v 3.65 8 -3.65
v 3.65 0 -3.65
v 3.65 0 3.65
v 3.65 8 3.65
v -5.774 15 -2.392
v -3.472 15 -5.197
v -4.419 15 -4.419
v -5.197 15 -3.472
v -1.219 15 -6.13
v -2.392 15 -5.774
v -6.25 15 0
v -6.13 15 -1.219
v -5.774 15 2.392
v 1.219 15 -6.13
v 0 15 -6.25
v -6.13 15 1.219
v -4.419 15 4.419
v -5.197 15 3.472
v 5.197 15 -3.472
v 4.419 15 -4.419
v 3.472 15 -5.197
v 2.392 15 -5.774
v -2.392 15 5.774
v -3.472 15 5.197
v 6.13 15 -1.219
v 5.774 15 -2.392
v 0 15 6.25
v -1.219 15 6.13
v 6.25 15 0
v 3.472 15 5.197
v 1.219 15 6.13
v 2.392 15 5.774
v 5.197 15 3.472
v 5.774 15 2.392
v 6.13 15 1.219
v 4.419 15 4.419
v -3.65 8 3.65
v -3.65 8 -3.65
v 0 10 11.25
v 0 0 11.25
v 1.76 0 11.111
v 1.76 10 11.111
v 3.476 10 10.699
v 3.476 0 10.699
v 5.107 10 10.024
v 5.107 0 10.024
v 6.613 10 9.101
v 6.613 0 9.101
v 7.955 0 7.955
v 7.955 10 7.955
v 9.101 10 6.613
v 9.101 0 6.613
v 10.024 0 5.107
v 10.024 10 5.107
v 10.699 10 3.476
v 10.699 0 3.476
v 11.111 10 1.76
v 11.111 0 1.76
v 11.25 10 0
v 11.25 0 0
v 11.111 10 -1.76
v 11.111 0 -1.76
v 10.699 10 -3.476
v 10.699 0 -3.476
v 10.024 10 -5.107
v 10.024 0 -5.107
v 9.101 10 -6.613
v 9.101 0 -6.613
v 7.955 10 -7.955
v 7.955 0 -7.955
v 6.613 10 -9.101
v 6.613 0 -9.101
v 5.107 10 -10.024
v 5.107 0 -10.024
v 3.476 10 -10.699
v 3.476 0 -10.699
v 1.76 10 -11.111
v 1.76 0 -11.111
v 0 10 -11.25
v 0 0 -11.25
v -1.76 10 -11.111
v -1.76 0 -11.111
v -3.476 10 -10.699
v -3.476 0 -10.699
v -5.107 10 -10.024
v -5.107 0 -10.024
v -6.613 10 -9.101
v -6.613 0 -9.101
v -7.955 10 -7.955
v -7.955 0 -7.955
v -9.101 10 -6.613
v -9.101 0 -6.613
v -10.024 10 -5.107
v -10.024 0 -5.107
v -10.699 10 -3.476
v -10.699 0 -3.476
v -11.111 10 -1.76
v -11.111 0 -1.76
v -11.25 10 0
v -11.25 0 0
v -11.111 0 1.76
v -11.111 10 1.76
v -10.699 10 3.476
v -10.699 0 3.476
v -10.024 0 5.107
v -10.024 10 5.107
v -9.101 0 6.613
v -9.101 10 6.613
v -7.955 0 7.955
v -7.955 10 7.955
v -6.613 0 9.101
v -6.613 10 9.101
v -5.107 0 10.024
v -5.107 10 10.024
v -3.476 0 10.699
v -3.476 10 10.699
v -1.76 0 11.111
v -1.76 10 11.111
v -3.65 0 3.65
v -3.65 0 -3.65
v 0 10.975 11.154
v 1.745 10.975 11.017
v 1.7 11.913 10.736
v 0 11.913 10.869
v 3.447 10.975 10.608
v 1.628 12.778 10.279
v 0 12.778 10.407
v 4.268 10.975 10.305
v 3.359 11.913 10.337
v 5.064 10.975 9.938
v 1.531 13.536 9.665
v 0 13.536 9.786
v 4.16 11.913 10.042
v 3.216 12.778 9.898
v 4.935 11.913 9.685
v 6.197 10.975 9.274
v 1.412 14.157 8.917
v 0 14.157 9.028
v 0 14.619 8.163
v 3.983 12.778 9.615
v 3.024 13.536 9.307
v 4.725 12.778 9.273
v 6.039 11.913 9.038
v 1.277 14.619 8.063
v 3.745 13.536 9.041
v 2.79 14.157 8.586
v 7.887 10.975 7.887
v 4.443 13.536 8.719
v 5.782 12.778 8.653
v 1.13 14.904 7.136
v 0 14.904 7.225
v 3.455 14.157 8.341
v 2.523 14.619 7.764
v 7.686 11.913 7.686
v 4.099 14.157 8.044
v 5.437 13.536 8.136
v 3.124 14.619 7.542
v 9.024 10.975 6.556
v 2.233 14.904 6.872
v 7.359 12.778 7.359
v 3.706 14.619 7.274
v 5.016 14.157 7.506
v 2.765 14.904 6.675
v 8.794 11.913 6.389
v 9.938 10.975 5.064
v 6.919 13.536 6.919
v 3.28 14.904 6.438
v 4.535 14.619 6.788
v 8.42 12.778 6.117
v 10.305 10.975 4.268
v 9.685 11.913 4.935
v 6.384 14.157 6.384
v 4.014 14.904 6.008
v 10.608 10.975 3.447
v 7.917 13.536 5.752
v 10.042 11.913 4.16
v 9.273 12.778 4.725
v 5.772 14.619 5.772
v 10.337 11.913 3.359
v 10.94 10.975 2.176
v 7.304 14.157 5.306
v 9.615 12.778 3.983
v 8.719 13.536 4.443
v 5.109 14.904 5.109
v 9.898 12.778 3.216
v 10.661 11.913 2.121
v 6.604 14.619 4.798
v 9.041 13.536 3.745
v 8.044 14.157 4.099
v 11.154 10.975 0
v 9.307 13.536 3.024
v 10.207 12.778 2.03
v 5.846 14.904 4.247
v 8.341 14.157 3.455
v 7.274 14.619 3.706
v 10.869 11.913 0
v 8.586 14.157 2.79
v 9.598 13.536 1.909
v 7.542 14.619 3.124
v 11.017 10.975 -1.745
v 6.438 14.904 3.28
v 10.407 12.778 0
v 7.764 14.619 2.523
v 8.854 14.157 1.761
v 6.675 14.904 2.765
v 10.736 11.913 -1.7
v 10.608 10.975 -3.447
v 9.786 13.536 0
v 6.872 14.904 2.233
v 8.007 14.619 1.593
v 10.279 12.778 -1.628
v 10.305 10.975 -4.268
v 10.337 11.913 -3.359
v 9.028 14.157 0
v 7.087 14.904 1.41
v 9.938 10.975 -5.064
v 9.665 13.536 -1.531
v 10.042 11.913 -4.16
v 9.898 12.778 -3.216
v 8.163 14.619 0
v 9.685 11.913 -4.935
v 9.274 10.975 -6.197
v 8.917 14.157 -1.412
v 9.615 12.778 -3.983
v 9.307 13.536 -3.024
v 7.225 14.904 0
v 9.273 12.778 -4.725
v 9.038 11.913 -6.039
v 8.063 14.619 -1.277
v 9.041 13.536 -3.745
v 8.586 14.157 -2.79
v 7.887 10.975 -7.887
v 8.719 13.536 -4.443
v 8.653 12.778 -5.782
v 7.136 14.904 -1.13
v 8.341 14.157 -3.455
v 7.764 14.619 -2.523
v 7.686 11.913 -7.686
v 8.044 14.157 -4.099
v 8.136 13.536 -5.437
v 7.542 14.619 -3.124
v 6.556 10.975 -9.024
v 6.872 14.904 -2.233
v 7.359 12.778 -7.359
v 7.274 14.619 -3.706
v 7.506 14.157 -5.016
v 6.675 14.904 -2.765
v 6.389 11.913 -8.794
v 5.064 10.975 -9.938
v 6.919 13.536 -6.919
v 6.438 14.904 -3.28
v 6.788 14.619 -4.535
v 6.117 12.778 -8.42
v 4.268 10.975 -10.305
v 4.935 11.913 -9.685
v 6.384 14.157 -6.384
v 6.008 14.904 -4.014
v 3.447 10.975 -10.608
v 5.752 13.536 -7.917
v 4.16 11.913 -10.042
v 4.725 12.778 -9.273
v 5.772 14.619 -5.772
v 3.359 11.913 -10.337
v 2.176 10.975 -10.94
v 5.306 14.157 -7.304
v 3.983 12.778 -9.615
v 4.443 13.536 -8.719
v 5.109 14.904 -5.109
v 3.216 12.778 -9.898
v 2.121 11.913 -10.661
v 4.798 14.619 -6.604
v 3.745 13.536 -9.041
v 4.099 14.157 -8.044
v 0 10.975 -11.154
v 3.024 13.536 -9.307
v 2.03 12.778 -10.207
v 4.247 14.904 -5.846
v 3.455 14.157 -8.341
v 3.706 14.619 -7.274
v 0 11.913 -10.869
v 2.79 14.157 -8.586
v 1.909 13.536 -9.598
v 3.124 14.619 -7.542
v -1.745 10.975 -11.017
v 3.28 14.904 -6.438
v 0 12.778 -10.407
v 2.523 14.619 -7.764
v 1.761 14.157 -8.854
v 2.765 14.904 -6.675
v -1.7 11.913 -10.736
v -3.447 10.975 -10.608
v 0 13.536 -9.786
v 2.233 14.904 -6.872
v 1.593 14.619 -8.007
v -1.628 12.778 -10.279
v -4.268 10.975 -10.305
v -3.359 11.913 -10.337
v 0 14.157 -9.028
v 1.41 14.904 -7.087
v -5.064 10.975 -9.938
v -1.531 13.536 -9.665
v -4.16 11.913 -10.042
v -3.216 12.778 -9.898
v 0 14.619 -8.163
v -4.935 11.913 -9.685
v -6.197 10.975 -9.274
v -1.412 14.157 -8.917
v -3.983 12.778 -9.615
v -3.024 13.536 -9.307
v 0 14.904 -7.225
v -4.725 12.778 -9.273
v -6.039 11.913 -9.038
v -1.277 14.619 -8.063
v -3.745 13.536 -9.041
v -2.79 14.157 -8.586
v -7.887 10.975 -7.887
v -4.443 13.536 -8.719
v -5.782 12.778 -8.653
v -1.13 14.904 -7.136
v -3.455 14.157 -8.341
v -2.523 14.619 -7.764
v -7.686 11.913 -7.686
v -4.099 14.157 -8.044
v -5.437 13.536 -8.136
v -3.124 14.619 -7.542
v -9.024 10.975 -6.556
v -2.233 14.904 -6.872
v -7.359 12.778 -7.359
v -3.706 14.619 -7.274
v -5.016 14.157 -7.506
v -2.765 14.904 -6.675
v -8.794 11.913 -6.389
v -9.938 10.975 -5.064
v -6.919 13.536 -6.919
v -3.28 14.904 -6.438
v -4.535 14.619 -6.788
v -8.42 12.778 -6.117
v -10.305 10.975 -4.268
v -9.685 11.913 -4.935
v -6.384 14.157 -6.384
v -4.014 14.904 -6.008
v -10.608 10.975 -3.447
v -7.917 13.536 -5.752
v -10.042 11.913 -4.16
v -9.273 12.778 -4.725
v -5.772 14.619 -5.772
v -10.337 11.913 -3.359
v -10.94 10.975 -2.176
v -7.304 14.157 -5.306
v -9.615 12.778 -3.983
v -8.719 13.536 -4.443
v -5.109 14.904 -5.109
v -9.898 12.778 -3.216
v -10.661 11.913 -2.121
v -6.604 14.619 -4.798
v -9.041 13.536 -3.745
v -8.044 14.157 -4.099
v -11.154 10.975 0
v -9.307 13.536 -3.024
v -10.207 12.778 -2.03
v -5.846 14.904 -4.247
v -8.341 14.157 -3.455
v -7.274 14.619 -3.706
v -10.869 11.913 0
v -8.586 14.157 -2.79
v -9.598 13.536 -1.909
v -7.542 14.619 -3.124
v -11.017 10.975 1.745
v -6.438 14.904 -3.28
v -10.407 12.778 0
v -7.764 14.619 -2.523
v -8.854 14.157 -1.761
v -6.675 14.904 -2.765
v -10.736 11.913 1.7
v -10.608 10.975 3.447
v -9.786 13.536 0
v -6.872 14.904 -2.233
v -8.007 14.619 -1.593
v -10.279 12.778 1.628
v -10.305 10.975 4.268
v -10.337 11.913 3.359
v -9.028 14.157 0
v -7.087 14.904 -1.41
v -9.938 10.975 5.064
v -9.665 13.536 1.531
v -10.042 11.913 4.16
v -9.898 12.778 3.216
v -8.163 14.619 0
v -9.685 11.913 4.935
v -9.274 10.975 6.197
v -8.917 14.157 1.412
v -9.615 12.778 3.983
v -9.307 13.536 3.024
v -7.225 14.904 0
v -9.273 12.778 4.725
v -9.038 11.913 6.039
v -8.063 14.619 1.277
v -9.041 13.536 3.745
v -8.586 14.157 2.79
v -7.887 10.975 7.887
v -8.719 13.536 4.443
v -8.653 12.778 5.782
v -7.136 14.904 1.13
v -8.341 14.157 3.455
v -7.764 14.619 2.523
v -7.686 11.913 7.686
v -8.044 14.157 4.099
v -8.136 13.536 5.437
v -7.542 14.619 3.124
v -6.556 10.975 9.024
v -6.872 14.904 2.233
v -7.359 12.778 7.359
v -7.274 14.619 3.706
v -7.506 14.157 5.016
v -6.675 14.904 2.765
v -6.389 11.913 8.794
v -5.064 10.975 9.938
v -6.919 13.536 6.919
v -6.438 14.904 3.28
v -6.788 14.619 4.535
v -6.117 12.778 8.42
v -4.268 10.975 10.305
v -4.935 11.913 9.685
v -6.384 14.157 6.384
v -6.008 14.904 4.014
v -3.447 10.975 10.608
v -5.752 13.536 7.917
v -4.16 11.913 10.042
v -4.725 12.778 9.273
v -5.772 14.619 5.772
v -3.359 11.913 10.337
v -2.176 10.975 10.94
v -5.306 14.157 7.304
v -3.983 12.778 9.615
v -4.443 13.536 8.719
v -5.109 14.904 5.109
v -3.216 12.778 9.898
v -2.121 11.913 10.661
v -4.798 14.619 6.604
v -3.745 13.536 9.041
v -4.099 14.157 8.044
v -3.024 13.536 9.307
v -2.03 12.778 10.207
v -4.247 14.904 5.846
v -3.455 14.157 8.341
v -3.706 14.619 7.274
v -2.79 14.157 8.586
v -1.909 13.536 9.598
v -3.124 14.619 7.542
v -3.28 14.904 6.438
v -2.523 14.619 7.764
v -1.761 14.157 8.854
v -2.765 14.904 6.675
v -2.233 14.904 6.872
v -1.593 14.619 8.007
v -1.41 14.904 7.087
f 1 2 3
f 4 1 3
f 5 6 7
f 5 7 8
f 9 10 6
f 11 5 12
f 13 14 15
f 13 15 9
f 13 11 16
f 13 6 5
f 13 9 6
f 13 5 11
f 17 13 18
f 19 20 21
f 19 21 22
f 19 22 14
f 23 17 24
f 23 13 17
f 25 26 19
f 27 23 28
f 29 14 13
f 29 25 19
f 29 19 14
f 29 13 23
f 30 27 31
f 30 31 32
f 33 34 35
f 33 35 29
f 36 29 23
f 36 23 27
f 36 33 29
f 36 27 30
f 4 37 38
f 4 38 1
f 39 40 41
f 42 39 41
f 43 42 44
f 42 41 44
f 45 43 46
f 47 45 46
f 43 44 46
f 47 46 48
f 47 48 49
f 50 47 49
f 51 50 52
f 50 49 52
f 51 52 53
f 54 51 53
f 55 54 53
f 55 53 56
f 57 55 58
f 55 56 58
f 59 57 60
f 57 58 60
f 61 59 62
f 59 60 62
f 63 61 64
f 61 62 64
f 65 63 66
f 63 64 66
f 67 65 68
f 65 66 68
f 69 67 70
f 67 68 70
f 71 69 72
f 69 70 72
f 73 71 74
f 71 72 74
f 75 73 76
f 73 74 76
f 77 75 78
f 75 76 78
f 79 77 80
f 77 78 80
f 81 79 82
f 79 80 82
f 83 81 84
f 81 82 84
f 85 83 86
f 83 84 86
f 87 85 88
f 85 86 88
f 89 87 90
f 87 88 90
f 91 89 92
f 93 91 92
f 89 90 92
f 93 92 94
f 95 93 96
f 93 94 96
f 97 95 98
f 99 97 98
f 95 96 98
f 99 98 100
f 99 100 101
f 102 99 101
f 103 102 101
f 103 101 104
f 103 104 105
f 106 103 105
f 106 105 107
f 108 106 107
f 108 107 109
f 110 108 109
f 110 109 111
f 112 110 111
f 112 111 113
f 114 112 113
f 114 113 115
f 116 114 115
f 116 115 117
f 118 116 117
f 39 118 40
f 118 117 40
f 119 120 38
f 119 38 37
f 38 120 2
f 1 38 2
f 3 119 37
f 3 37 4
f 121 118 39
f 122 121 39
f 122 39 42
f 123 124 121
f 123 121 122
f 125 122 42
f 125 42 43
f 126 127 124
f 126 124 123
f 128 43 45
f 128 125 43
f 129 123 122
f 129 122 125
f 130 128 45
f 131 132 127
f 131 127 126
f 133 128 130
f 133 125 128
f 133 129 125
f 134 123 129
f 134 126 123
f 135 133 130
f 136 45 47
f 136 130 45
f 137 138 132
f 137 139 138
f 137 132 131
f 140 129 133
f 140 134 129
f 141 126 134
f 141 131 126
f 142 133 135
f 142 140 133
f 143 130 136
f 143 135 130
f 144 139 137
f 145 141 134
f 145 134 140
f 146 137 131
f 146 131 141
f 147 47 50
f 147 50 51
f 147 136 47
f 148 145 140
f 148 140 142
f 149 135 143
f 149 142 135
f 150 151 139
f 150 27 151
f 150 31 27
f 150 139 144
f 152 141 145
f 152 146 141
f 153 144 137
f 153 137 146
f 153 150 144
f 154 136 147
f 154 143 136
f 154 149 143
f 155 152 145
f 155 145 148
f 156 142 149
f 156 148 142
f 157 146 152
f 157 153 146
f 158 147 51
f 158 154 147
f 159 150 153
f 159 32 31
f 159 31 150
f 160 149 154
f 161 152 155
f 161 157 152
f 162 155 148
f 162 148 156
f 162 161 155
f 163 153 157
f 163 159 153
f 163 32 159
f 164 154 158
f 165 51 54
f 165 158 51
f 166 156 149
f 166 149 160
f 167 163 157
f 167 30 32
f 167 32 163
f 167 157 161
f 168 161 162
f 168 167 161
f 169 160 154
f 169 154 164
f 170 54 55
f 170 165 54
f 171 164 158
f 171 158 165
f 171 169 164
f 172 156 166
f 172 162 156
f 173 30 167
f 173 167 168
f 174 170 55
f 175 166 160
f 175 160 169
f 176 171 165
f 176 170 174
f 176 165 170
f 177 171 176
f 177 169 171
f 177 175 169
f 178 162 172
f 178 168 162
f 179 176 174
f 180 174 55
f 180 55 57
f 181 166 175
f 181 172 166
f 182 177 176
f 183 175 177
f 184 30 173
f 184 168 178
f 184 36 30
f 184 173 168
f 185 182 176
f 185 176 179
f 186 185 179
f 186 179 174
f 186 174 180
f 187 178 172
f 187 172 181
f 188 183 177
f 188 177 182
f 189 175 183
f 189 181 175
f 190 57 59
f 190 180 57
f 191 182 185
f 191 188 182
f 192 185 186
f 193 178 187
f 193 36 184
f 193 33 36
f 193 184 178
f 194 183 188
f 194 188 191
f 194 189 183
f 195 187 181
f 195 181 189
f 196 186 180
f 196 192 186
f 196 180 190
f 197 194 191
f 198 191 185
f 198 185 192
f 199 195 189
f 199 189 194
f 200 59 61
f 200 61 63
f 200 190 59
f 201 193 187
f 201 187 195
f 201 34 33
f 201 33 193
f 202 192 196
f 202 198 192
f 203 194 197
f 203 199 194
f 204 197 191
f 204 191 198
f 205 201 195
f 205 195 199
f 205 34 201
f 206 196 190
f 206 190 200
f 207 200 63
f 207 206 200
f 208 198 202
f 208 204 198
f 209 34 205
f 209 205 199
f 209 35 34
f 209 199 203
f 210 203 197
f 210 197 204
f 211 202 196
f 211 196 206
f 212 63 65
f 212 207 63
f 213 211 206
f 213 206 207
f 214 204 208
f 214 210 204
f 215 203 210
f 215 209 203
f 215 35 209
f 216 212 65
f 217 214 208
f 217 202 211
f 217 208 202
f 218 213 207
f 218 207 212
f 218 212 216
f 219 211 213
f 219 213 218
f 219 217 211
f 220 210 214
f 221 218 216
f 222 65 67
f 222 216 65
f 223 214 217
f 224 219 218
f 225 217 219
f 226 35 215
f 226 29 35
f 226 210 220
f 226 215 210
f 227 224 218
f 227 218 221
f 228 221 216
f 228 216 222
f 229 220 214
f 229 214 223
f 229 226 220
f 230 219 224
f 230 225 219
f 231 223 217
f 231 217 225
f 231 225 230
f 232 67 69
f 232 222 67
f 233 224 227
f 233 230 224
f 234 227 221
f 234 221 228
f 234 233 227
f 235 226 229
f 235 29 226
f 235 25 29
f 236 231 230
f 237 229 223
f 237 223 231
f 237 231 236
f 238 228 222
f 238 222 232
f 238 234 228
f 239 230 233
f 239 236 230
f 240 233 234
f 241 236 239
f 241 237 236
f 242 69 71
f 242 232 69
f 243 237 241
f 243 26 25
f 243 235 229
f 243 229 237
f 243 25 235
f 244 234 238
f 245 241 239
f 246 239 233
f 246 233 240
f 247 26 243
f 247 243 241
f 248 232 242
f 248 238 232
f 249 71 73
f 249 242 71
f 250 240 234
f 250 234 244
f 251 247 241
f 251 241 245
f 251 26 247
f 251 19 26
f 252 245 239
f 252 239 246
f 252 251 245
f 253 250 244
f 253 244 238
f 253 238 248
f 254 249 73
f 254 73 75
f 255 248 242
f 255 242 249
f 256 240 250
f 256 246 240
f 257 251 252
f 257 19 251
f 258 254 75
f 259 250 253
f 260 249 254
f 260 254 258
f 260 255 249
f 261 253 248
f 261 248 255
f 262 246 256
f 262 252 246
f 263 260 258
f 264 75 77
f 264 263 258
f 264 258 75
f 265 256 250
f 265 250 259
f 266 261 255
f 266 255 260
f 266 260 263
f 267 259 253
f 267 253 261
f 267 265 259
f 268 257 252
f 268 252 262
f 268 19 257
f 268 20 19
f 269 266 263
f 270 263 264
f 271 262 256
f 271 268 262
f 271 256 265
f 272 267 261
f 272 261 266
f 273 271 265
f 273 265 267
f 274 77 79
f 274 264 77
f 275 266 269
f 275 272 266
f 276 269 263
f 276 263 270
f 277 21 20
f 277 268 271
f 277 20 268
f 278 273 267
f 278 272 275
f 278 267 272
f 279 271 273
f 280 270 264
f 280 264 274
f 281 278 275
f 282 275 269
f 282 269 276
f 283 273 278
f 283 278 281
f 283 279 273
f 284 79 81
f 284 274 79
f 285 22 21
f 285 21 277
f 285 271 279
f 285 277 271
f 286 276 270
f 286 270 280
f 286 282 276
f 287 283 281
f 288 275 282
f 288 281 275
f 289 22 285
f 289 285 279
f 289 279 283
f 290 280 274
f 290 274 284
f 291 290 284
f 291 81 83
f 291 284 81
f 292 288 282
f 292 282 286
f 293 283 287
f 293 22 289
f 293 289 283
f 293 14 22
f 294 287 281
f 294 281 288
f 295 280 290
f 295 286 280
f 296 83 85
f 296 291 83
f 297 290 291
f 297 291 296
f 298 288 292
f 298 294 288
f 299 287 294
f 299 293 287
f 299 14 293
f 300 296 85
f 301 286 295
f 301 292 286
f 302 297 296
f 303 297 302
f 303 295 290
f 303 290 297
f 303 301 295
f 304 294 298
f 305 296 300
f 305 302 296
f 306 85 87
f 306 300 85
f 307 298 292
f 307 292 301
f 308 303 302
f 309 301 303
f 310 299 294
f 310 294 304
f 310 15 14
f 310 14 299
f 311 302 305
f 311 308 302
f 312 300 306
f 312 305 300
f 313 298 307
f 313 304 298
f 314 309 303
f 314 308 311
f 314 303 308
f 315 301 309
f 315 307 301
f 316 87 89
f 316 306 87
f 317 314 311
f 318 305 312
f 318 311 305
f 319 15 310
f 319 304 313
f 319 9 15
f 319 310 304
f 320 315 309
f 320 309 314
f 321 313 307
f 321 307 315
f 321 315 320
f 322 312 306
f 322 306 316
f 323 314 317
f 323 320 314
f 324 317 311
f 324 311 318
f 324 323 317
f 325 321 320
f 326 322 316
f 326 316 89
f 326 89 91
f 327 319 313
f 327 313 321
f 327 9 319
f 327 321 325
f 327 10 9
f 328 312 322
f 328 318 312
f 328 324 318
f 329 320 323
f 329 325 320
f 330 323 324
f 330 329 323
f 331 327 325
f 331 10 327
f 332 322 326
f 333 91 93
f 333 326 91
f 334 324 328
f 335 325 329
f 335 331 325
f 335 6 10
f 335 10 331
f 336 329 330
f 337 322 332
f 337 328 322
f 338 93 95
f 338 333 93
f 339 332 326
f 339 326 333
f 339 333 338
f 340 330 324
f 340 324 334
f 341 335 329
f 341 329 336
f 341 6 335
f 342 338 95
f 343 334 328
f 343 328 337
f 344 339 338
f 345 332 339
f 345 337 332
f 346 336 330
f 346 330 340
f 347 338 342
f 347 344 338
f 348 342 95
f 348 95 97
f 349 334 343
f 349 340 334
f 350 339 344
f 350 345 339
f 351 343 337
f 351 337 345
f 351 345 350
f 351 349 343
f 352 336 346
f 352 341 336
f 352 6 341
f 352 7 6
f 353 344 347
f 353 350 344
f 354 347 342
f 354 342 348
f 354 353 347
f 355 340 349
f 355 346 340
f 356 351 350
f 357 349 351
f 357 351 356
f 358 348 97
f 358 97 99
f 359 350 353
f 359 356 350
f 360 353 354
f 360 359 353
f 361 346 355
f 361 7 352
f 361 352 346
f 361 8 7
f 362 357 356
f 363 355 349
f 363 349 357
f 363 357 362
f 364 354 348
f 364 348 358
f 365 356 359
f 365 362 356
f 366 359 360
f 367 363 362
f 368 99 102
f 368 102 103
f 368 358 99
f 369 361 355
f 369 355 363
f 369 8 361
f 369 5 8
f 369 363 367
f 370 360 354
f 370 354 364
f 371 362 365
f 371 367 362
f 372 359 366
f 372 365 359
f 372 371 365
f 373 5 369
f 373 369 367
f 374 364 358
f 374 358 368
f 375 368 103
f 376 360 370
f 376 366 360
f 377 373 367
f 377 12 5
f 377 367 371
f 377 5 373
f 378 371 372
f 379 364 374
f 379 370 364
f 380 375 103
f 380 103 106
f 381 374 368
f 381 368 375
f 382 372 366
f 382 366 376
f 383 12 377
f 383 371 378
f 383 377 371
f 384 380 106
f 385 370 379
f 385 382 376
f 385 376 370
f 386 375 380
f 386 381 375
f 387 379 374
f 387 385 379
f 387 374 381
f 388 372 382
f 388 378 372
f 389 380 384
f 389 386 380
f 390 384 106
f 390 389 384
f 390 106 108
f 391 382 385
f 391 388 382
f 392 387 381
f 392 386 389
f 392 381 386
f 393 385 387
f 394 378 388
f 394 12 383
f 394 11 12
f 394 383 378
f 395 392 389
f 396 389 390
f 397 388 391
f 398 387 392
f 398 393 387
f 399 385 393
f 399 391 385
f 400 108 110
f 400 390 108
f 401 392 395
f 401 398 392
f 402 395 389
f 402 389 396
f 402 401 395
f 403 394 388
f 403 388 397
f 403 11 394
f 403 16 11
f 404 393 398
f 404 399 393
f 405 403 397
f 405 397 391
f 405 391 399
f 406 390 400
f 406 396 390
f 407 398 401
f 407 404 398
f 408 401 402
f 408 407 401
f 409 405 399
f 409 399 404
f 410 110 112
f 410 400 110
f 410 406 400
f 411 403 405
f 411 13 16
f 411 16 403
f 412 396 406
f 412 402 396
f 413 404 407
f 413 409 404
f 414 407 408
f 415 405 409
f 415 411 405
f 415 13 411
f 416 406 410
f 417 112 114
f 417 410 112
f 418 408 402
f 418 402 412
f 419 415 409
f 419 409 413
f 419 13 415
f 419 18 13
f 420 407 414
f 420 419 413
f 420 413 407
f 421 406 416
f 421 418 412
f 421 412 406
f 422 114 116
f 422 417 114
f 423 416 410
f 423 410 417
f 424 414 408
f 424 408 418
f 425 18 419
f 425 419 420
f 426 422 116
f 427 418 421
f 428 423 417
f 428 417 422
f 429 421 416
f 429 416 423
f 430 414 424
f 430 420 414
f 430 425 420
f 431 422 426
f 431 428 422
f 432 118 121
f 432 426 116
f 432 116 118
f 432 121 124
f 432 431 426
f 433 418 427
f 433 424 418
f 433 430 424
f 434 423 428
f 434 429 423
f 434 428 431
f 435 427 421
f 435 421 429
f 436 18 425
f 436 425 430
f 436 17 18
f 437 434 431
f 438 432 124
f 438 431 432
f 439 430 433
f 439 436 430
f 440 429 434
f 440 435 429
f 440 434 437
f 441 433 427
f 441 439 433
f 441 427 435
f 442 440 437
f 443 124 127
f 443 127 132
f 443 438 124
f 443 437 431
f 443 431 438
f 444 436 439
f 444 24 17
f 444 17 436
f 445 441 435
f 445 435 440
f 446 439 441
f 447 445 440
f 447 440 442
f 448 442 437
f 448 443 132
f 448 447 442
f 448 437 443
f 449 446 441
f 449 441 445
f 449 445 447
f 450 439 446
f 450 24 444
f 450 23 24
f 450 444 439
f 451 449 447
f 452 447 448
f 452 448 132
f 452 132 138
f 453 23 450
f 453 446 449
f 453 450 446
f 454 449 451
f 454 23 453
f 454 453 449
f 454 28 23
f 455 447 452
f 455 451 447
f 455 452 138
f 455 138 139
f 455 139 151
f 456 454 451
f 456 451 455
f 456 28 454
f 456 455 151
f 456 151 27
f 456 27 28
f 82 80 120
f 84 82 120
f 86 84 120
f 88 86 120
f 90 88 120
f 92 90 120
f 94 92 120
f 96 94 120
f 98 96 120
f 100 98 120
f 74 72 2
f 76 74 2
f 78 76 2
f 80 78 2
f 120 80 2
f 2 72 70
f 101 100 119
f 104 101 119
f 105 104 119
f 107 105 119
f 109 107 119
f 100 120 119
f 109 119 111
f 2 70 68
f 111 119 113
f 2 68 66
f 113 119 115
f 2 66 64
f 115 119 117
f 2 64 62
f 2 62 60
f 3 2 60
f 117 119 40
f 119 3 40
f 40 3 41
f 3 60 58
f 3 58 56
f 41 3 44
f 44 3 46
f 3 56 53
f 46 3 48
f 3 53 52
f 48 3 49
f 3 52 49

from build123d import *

# Parameters (mm, degrees)
SKETCH_1_R          = 11.25
EXTRUDE_1_DEPTH     = 15
FILLET_1_R          = 5
SKETCH_2_W          = 7.3
SKETCH_2_H          = 7.3
CUT_EXTRUDE_1_DEPTH = 8


with BuildPart() as part:
    # 草图1 → 凸台-拉伸1 (new body)
    with BuildSketch(Plane(origin=(0, 0, 0), x_dir=(1, 0, 0), z_dir=(0, 1, 0))):
        with Locations(Location((0, 0, 0), (0, 0, 270))):
            Circle(SKETCH_1_R)
    extrude(amount=EXTRUDE_1_DEPTH)

    # 圆角1
    fillet_1_edges = [part.edges().sort_by_distance(p)[0] for p in [
        (0, 15, -11.25),
    ]]
    fillet(fillet_1_edges, radius=FILLET_1_R)

    # 草图2 → 切除-拉伸1 (cut)
    with BuildSketch(Plane.XZ):
        Rectangle(SKETCH_2_W, SKETCH_2_H)
    extrude(amount=-CUT_EXTRUDE_1_DEPTH, mode=Mode.SUBTRACT)


solid = part.part
